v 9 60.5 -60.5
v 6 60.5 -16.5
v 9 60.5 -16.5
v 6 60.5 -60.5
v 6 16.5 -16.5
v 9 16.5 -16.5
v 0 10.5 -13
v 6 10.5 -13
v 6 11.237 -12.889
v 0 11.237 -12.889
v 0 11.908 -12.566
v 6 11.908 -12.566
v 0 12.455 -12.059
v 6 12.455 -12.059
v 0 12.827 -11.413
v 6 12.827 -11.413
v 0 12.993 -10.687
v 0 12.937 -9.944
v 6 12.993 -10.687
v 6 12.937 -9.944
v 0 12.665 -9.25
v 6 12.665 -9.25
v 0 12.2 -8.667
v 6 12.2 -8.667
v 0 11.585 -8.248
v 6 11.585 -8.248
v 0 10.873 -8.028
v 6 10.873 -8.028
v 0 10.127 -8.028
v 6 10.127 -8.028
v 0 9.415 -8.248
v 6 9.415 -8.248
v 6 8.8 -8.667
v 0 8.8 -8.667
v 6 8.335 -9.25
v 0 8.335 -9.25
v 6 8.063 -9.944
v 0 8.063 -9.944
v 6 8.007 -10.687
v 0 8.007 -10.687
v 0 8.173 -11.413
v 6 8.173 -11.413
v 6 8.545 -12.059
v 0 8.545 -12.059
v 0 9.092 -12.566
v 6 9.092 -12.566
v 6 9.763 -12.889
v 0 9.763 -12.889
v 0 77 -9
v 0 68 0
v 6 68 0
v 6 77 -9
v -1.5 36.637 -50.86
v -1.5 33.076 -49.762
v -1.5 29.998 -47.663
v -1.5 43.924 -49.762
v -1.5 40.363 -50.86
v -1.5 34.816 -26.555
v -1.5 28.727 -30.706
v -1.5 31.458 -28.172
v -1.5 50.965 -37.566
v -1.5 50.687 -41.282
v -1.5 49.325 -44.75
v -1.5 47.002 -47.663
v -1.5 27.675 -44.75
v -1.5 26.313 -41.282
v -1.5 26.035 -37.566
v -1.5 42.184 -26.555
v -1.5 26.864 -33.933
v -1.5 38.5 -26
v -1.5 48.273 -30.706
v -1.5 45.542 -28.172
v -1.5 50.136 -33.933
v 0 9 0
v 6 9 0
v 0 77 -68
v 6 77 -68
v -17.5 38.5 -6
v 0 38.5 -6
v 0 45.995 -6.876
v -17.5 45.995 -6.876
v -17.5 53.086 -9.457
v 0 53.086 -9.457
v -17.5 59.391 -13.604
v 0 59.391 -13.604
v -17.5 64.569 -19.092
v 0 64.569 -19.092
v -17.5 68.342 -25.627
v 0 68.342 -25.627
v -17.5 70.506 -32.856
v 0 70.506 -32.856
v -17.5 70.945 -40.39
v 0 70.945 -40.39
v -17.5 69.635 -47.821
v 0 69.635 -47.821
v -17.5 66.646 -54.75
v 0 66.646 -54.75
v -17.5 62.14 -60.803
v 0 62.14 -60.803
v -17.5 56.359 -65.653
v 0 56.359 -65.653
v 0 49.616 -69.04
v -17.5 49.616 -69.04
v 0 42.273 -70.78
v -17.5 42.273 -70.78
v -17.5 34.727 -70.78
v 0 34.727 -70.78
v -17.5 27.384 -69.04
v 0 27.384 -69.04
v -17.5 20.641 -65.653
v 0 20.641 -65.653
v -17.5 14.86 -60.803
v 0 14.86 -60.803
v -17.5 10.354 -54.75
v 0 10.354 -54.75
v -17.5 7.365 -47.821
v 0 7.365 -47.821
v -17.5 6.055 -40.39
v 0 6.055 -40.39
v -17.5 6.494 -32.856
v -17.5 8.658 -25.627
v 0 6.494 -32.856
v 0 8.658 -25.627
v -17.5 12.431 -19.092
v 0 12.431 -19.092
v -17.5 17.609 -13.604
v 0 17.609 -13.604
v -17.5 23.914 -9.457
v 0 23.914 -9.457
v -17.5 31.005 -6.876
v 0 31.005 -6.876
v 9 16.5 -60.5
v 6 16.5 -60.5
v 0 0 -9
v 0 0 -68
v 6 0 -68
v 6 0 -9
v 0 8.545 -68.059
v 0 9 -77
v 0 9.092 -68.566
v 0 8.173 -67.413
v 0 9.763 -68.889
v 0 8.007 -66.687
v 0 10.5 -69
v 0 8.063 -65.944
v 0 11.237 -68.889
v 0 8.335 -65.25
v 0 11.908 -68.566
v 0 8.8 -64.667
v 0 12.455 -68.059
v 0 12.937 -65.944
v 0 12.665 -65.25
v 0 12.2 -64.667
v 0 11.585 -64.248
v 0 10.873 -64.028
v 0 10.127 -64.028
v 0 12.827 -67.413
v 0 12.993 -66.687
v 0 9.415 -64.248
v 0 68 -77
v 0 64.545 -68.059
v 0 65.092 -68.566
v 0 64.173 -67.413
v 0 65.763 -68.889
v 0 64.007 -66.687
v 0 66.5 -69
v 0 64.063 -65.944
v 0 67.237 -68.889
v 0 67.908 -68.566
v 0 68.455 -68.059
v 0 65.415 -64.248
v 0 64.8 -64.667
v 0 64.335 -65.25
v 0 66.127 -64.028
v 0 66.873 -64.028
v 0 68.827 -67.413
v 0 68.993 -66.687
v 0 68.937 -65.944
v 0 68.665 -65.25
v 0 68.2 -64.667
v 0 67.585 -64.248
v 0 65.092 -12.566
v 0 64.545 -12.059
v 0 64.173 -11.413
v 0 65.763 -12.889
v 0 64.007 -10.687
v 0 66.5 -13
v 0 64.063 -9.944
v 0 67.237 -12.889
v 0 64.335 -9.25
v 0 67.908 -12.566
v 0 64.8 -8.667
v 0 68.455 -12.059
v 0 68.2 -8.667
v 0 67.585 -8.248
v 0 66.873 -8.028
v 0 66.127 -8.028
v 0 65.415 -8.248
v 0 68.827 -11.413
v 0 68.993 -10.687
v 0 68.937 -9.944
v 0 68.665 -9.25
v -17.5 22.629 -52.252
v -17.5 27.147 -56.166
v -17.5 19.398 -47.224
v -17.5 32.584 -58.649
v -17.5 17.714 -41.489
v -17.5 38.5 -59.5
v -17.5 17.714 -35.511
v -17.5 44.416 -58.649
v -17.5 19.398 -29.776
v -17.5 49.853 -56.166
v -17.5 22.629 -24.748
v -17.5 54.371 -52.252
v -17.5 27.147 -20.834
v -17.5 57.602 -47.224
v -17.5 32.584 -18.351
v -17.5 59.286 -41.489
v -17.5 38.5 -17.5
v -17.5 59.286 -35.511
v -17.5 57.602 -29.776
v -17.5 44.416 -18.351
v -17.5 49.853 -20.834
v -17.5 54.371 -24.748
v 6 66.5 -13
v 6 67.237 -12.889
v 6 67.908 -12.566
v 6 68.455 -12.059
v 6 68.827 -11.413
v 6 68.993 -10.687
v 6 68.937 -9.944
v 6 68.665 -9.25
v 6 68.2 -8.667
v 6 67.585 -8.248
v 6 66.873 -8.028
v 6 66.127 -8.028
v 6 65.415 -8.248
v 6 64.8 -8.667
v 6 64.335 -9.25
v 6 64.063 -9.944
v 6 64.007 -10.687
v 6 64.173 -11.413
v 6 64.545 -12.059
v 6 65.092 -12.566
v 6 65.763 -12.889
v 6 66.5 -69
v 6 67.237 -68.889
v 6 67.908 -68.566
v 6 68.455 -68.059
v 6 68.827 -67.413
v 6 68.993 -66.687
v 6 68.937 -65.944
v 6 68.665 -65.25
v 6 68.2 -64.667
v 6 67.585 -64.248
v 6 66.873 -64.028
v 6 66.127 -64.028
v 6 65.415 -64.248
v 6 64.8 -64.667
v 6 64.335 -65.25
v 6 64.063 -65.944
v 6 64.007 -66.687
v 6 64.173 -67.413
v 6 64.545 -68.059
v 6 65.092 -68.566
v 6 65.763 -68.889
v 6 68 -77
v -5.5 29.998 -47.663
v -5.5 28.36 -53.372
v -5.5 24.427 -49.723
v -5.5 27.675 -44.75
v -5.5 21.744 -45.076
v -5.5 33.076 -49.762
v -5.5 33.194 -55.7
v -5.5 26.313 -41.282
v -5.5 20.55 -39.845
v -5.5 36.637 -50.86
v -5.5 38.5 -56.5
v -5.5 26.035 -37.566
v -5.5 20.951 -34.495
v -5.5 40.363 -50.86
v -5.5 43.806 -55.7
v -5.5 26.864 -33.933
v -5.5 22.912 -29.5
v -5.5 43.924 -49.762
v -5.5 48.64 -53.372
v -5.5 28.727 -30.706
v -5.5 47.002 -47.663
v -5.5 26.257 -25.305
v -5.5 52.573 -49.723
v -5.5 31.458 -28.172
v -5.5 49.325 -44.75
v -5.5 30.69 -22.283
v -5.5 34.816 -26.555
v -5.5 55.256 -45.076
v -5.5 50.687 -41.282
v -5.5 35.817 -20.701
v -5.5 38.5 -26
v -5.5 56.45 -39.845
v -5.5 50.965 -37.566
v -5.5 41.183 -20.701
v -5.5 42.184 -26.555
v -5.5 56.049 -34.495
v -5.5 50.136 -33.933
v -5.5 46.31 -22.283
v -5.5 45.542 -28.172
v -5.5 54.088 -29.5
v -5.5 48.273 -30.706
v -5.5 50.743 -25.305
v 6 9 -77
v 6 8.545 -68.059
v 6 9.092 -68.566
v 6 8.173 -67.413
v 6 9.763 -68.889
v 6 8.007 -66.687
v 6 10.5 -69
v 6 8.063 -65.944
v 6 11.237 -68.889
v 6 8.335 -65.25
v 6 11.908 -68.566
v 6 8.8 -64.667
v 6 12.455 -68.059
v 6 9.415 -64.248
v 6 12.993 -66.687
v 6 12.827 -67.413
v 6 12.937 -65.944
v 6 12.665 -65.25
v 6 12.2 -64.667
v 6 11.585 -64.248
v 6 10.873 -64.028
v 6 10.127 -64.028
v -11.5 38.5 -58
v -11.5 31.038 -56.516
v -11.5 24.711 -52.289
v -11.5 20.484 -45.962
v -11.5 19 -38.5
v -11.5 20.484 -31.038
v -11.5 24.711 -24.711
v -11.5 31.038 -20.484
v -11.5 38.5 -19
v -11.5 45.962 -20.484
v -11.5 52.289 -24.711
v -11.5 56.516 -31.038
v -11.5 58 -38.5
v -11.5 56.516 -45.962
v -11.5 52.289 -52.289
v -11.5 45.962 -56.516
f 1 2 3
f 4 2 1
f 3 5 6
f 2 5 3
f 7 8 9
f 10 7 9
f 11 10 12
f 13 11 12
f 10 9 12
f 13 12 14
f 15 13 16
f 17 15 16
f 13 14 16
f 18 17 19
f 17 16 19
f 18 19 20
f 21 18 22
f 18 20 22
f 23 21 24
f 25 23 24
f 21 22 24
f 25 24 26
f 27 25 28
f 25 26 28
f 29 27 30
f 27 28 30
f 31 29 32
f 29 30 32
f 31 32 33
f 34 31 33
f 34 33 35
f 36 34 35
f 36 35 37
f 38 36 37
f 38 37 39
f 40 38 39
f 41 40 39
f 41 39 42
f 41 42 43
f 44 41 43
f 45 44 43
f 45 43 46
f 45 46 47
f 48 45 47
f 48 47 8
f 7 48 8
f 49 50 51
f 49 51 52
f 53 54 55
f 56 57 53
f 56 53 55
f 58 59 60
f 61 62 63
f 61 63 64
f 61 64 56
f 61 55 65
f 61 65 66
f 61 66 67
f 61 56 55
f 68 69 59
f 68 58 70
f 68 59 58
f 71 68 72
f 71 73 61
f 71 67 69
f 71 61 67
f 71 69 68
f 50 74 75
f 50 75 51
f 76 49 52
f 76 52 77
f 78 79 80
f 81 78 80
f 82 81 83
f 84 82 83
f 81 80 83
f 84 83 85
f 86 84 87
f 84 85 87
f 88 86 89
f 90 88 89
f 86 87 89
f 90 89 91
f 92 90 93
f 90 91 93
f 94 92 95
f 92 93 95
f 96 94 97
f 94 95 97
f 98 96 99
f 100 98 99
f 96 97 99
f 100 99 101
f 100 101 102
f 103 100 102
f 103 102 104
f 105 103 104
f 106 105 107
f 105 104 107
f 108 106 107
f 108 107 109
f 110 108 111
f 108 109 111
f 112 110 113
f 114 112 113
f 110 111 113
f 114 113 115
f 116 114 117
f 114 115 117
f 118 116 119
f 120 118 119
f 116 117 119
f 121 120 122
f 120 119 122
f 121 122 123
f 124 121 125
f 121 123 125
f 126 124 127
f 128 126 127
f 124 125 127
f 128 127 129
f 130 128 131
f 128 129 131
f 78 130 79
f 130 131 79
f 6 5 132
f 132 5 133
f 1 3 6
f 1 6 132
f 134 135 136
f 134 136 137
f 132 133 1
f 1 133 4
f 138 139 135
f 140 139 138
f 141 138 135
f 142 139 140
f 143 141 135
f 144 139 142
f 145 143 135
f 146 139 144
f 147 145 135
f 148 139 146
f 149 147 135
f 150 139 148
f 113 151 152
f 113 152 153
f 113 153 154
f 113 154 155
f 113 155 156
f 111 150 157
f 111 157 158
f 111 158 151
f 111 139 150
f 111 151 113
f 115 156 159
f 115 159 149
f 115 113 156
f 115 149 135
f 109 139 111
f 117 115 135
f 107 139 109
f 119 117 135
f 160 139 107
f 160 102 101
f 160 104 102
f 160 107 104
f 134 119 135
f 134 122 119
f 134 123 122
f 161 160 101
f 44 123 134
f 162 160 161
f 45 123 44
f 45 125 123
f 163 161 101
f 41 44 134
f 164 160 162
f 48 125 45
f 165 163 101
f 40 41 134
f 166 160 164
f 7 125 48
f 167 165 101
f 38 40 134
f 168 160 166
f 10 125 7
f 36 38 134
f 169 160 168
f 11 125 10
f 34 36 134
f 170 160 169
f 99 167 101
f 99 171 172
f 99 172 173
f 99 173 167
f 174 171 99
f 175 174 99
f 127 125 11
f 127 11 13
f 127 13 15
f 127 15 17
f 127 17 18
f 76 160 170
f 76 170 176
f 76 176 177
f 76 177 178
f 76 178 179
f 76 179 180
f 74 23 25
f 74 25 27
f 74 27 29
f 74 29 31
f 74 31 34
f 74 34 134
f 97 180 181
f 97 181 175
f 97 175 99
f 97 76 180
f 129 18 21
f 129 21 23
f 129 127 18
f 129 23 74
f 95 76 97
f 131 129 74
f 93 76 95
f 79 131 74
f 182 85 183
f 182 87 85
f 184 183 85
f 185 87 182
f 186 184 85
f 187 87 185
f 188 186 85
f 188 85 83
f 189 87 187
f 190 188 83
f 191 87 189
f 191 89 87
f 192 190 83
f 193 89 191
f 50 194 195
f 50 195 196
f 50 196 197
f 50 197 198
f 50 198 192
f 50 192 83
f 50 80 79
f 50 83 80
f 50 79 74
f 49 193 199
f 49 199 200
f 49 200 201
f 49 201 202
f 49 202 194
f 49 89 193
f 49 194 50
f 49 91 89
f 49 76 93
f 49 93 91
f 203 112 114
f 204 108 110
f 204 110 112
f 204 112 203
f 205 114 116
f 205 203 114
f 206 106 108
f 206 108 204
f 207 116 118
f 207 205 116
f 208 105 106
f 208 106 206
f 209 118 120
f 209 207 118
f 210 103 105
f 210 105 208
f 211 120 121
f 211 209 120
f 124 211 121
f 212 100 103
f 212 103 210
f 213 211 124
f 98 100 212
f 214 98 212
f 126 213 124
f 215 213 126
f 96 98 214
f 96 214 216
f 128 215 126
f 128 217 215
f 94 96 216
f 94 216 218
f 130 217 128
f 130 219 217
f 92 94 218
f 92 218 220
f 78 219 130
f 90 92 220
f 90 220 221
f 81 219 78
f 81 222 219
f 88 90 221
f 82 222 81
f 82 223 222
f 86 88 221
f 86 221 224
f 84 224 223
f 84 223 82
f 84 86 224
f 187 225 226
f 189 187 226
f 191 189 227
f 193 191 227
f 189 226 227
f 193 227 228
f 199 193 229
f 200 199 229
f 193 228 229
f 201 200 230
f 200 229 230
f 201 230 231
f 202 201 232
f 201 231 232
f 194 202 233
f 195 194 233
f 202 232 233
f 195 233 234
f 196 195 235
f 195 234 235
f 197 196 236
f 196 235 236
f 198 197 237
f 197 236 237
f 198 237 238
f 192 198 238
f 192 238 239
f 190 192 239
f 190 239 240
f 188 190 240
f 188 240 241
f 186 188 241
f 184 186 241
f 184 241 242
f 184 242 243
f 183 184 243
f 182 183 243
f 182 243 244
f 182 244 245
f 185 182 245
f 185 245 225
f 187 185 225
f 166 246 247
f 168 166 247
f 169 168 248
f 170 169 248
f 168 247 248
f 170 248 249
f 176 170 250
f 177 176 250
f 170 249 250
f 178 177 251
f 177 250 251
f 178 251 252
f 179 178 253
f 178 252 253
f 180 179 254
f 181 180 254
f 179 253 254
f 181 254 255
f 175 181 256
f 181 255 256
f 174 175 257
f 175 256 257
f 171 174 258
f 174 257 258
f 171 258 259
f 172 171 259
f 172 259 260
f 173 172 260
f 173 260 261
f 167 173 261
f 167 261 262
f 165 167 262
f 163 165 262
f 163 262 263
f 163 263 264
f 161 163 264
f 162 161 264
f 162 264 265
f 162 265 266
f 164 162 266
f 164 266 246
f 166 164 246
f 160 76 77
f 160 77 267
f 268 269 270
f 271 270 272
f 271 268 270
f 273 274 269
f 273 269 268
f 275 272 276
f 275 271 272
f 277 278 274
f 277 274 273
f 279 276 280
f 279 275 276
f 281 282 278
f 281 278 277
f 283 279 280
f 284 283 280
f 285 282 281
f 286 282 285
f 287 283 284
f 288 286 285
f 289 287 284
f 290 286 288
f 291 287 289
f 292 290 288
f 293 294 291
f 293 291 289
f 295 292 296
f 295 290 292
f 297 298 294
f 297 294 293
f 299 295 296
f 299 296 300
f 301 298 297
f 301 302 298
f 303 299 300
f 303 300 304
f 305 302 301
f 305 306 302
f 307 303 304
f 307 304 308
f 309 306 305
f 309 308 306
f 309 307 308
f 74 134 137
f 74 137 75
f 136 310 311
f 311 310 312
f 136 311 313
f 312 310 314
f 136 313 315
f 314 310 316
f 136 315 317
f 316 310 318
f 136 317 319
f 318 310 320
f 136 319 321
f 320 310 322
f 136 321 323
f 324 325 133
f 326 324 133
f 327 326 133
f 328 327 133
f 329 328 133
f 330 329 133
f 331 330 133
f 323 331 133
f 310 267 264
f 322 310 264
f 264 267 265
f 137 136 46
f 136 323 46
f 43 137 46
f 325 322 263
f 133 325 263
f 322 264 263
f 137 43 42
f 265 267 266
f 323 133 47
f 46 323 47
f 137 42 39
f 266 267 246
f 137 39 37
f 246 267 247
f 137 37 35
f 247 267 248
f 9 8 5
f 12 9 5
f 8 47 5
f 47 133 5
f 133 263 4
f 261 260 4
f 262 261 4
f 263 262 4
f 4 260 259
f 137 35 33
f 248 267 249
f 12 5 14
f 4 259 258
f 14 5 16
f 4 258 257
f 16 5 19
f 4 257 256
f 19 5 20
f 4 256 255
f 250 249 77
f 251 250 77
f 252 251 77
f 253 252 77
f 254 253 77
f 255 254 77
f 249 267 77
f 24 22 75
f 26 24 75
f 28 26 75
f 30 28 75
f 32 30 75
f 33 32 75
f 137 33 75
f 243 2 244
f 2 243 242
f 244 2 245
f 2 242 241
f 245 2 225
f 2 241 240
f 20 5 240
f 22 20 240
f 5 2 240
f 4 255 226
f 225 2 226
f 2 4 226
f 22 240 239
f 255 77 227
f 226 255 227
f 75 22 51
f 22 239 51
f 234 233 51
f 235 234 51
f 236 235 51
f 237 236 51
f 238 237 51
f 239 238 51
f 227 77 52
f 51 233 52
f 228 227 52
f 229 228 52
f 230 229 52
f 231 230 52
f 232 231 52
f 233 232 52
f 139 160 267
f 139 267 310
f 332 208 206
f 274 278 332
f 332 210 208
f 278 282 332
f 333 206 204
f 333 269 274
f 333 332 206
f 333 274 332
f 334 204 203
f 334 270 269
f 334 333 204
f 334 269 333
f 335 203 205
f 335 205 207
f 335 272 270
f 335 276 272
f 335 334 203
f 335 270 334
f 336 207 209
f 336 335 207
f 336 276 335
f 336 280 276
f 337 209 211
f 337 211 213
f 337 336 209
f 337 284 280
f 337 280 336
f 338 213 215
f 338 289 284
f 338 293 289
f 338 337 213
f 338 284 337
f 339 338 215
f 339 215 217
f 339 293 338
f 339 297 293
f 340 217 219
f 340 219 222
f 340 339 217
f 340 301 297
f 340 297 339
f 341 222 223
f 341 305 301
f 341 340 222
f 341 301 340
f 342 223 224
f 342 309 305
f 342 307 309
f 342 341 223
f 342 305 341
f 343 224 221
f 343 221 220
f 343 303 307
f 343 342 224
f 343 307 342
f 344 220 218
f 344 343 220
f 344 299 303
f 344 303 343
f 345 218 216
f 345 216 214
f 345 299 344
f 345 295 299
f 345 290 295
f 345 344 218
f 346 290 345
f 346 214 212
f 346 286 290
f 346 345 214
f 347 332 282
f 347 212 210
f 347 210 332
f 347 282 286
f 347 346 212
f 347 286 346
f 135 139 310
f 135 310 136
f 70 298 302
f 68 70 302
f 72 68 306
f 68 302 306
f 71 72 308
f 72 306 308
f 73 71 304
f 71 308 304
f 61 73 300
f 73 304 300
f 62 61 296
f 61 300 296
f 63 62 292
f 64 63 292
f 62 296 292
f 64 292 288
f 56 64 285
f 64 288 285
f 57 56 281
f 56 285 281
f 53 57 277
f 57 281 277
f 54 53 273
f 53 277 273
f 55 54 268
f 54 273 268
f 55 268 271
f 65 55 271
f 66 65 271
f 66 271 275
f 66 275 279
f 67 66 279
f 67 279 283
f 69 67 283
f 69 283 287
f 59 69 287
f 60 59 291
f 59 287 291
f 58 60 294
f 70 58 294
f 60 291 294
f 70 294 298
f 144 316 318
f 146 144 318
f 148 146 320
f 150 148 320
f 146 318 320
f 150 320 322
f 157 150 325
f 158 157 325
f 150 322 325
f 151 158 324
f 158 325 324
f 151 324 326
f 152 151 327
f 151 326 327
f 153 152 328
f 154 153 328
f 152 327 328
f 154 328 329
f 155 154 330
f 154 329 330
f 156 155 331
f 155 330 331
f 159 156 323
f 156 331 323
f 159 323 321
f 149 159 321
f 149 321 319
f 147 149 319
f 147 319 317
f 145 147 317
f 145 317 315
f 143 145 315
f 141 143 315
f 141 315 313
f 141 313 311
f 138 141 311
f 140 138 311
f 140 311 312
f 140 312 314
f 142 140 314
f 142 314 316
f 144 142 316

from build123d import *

# Parameters (mm, degrees)
EXTRUDE1_DEPTH            = 6
SKETCH2_W                 = 44
SKETCH2_H                 = 44
EXTRUDE2_DEPTH            = 3
SKETCH4_R                 = 32.5
EXTRUDE3_DEPTH            = 17.5
SKETCH16_R                = 21
EXTRUDE7_DEPTH            = 12
SKETCH19_R                = 2.5
EXTRUDE8_DEPTH            = 24.5
LPATTERN1_COUNT           = 2
LPATTERN1_PITCH           = 56
LPATTERN2_COUNT           = 2
LPATTERN2_PITCH           = 56
LPATTERN2_COPY_1_SKETCH_R = 2.5
LPATTERN2_COPY_1_DEPTH    = 24.5
SKETCH20_R                = 12.5
EXTRUDE10_DEPTH           = 4


with BuildPart() as part:
    # Sketch1 → Extrude1 (new body)
    with BuildSketch(Plane(origin=(0, 0, 0), x_dir=(0, 0, -1), z_dir=(1, 0, 0))):
        Polygon((0, 68), (9, 77), (68, 77), (77, 68), (77, 9), (68, 0), (9, 0), (0, 9), align=None)
    extrude(amount=EXTRUDE1_DEPTH)

    # Sketch2 → Extrude2 (add)
    with BuildSketch(Plane(origin=(6, 0, 0), x_dir=(0, 0, -1), z_dir=(1, 0, 0))):
        with Locations((38.5, 38.5)):
            Rectangle(SKETCH2_W, SKETCH2_H)
    extrude(amount=EXTRUDE2_DEPTH)

    # Sketch4 → Extrude3 (add)
    with BuildSketch(Plane.ZY):
        with Locations((-38.5, 38.5)):
            Circle(SKETCH4_R)
    extrude(amount=EXTRUDE3_DEPTH)

    # Sketch16 → Extrude7 (cut)
    with BuildSketch(Plane.ZY.offset(17.5)):
        with Locations((-38.5, 38.5)):
            Circle(SKETCH16_R)
    extrude(amount=-EXTRUDE7_DEPTH, mode=Mode.SUBTRACT)

    # Sketch18 → Revolve2 (revolve)
    with BuildSketch(Plane.XZ.offset(-38.5)):
        Polygon((-5.5, -56.5), (-5.5, -59.5), (-17.5, -59.5), align=None)
    revolve(axis=Axis((9, 38.5, -38.5), (-1, 0, 0)))

    # Sketch19 → Extrude8 (cut, through all)
    with BuildSketch(Plane(origin=(6, 0, 0), x_dir=(0, 0, -1), z_dir=(1, 0, 0))):
        with Locations((10.5, 66.5)):
            Circle(SKETCH19_R)
    extrude8 = extrude(amount=-EXTRUDE8_DEPTH, mode=Mode.SUBTRACT)

    # LPattern1: Extrude8 ×2
    with Locations(*[(0, 0, -i * LPATTERN1_PITCH) for i in range(1, LPATTERN1_COUNT)]):
        add(extrude8, mode=Mode.SUBTRACT)

    # LPattern2: Extrude8 ×2
    with Locations(*[(0, -i * LPATTERN2_PITCH, 0) for i in range(1, LPATTERN2_COUNT)]):
        add(extrude8, mode=Mode.SUBTRACT)

    # LPattern2 copy 1 sketch → LPattern2 copy 1 (cut, through all)
    with BuildSketch(Plane(origin=(6, -56, -56), x_dir=(0, 0, -1), z_dir=(1, 0, 0))):
        with Locations((10.5, 66.5)):
            Circle(LPATTERN2_COPY_1_SKETCH_R)
    extrude(amount=-LPATTERN2_COPY_1_DEPTH, mode=Mode.SUBTRACT)

    # Sketch20 → Extrude10 (cut)
    with BuildSketch(Plane.ZY.offset(5.5)):
        with Locations((-38.5, 38.5)):
            Circle(SKETCH20_R)
    extrude(amount=-EXTRUDE10_DEPTH, mode=Mode.SUBTRACT)


solid = part.part
